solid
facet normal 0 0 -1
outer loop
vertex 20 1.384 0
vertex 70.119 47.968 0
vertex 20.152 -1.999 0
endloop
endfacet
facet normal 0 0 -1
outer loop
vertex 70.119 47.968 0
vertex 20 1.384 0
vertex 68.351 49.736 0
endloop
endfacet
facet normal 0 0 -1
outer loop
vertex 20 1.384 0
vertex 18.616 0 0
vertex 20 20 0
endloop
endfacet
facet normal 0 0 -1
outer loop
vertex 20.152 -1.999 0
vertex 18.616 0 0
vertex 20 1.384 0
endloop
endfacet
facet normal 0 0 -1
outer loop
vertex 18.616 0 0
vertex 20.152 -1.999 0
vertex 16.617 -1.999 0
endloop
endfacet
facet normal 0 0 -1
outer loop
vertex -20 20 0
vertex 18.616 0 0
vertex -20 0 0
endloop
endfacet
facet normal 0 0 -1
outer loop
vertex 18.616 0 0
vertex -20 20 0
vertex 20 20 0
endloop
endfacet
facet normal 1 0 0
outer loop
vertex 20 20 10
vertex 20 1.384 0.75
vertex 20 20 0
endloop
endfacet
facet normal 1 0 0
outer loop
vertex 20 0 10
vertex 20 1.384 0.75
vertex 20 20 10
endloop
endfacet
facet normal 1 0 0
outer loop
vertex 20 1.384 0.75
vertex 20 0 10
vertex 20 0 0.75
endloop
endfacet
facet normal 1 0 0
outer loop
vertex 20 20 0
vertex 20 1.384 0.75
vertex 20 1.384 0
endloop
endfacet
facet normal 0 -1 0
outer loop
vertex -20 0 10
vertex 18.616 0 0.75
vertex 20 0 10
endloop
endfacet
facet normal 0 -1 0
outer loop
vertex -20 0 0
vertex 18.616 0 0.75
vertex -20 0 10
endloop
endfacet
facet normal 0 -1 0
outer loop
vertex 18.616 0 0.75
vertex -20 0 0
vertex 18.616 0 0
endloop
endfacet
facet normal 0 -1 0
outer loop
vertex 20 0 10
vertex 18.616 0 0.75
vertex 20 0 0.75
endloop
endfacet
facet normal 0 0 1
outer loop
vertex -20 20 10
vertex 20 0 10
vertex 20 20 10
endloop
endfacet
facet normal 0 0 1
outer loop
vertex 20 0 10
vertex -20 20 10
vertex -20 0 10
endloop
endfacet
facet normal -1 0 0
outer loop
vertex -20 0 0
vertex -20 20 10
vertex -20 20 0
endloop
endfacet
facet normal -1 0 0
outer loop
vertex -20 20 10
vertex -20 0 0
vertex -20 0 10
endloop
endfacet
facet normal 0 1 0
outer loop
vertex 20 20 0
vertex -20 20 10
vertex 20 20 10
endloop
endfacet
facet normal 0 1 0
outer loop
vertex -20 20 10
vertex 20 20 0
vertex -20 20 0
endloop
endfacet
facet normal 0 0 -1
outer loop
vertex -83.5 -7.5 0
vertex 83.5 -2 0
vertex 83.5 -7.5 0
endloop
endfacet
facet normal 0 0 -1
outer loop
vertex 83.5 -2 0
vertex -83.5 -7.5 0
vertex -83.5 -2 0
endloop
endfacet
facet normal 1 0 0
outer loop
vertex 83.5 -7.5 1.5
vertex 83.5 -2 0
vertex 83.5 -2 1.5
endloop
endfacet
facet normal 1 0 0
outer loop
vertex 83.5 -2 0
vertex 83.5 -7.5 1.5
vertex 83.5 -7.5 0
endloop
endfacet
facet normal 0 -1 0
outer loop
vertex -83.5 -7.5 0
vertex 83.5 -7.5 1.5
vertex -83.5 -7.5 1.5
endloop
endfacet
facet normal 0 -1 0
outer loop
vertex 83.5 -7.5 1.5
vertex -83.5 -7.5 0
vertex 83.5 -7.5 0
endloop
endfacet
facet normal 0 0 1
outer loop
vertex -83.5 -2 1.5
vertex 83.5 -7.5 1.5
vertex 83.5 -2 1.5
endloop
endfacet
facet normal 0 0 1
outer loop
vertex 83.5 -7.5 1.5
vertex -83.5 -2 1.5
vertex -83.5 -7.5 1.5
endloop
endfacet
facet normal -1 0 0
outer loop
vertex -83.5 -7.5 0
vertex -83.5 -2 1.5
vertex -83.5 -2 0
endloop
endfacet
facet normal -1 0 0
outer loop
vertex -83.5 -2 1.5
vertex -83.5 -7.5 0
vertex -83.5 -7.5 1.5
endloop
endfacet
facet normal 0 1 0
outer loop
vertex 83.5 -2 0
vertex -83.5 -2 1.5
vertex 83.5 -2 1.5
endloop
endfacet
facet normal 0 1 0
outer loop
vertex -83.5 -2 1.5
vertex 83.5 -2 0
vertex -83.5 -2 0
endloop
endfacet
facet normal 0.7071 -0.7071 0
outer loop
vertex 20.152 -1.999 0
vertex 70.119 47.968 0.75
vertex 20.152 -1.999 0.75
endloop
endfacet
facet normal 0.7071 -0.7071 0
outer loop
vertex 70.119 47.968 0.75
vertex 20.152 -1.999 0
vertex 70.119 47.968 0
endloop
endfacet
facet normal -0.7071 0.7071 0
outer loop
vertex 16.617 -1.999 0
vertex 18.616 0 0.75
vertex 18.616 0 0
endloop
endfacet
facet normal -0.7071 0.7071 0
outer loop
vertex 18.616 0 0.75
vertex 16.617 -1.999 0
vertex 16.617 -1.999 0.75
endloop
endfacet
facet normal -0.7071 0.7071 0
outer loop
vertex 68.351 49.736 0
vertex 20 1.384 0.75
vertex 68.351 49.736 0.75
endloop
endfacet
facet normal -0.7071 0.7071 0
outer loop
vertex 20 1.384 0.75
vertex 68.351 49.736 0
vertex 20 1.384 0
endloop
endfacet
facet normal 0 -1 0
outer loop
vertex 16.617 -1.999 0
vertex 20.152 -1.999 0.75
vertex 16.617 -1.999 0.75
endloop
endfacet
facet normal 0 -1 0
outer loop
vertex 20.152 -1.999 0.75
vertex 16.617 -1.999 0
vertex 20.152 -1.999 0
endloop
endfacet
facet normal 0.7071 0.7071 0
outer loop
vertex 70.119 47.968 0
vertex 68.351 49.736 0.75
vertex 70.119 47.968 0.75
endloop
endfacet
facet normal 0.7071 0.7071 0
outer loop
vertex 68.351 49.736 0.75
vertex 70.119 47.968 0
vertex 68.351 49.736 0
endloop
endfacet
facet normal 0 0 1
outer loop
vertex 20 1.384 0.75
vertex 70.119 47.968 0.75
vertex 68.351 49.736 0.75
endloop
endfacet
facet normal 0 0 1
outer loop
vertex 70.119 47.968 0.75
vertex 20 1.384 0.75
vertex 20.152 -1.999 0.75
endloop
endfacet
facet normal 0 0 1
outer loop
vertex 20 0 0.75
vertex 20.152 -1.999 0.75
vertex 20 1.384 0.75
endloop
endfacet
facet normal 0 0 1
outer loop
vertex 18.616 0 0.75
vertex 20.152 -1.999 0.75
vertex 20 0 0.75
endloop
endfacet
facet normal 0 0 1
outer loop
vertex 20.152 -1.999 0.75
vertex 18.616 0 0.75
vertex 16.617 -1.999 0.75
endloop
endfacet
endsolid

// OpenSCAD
// Generated by DescriptiveCAD bootstrap v0.2
  // boundary visualization
  polyhedron(points=[[-34.586832, 83.505000, 0.000000], [34.586832, 83.505000, 0.000000], [34.586832, 83.495000, 0.000000], [-34.586832, 83.495000, 0.000000], [-34.586832, 83.505000, 1.000000], [34.586832, 83.505000, 1.000000], [34.586832, 83.495000, 1.000000], [-34.586832, 83.495000, 1.000000]], faces=[[0, 1, 2, 3], [4, 5, 6, 7], [0, 1, 5, 4], [1, 2, 6, 5], [2, 3, 7, 6], [3, 0, 4, 7]]);
  polyhedron(points=[[34.590368, 83.503536, 0.000000], [83.503536, 34.590368, 0.000000], [83.496464, 34.583297, 0.000000], [34.583297, 83.496464, 0.000000], [34.590368, 83.503536, 1.000000], [83.503536, 34.590368, 1.000000], [83.496464, 34.583297, 1.000000], [34.583297, 83.496464, 1.000000]], faces=[[0, 1, 2, 3], [4, 5, 6, 7], [0, 1, 5, 4], [1, 2, 6, 5], [2, 3, 7, 6], [3, 0, 4, 7]]);
  polyhedron(points=[[83.505000, 34.586832, 0.000000], [83.505000, -34.586832, 0.000000], [83.495000, -34.586832, 0.000000], [83.495000, 34.586832, 0.000000], [83.505000, 34.586832, 1.000000], [83.505000, -34.586832, 1.000000], [83.495000, -34.586832, 1.000000], [83.495000, 34.586832, 1.000000]], faces=[[0, 1, 2, 3], [4, 5, 6, 7], [0, 1, 5, 4], [1, 2, 6, 5], [2, 3, 7, 6], [3, 0, 4, 7]]);
  polyhedron(points=[[83.503536, -34.590368, 0.000000], [34.590368, -83.503536, 0.000000], [34.583297, -83.496464, 0.000000], [83.496464, -34.583297, 0.000000], [83.503536, -34.590368, 1.000000], [34.590368, -83.503536, 1.000000], [34.583297, -83.496464, 1.000000], [83.496464, -34.583297, 1.000000]], faces=[[0, 1, 2, 3], [4, 5, 6, 7], [0, 1, 5, 4], [1, 2, 6, 5], [2, 3, 7, 6], [3, 0, 4, 7]]);
  polyhedron(points=[[34.586832, -83.505000, 0.000000], [-34.586832, -83.505000, 0.000000], [-34.586832, -83.495000, 0.000000], [34.586832, -83.495000, 0.000000], [34.586832, -83.505000, 1.000000], [-34.586832, -83.505000, 1.000000], [-34.586832, -83.495000, 1.000000], [34.586832, -83.495000, 1.000000]], faces=[[0, 1, 2, 3], [4, 5, 6, 7], [0, 1, 5, 4], [1, 2, 6, 5], [2, 3, 7, 6], [3, 0, 4, 7]]);
  polyhedron(points=[[-34.590368, -83.503536, 0.000000], [-83.503536, -34.590368, 0.000000], [-83.496464, -34.583297, 0.000000], [-34.583297, -83.496464, 0.000000], [-34.590368, -83.503536, 1.000000], [-83.503536, -34.590368, 1.000000], [-83.496464, -34.583297, 1.000000], [-34.583297, -83.496464, 1.000000]], faces=[[0, 1, 2, 3], [4, 5, 6, 7], [0, 1, 5, 4], [1, 2, 6, 5], [2, 3, 7, 6], [3, 0, 4, 7]]);
  polyhedron(points=[[-83.505000, -34.586832, 0.000000], [-83.505000, 34.586832, 0.000000], [-83.495000, 34.586832, 0.000000], [-83.495000, -34.586832, 0.000000], [-83.505000, -34.586832, 1.000000], [-83.505000, 34.586832, 1.000000], [-83.495000, 34.586832, 1.000000], [-83.495000, -34.586832, 1.000000]], faces=[[0, 1, 2, 3], [4, 5, 6, 7], [0, 1, 5, 4], [1, 2, 6, 5], [2, 3, 7, 6], [3, 0, 4, 7]]);
  polyhedron(points=[[-83.503536, 34.590368, 0.000000], [-34.590368, 83.503536, 0.000000], [-34.583297, 83.496464, 0.000000], [-83.496464, 34.583297, 0.000000], [-83.503536, 34.590368, 1.000000], [-34.590368, 83.503536, 1.000000], [-34.583297, 83.496464, 1.000000], [-83.496464, 34.583297, 1.000000]], faces=[[0, 1, 2, 3], [4, 5, 6, 7], [0, 1, 5, 4], [1, 2, 6, 5], [2, 3, 7, 6], [3, 0, 4, 7]]);
  translate([0,0,0]) linear_extrude(height=10) polygon(points=[[-20.000000, 20.000000], [20.000000, 20.000000], [20.000000, 0.000000], [-20.000000, 0.000000]]);
  translate([0,0,0.0]) linear_extrude(height=1.5) polygon(points=[[-83.500000, -2.000000], [-83.500000, -7.500000], [83.500000, -7.500000], [83.500000, -2.000000]]);
  translate([0,0,0.0]) linear_extrude(height=0.75) polygon(points=[[20.152064, -1.999000], [70.118948, 47.967884], [68.351181, 49.735651], [16.616530, -1.999000]]);
